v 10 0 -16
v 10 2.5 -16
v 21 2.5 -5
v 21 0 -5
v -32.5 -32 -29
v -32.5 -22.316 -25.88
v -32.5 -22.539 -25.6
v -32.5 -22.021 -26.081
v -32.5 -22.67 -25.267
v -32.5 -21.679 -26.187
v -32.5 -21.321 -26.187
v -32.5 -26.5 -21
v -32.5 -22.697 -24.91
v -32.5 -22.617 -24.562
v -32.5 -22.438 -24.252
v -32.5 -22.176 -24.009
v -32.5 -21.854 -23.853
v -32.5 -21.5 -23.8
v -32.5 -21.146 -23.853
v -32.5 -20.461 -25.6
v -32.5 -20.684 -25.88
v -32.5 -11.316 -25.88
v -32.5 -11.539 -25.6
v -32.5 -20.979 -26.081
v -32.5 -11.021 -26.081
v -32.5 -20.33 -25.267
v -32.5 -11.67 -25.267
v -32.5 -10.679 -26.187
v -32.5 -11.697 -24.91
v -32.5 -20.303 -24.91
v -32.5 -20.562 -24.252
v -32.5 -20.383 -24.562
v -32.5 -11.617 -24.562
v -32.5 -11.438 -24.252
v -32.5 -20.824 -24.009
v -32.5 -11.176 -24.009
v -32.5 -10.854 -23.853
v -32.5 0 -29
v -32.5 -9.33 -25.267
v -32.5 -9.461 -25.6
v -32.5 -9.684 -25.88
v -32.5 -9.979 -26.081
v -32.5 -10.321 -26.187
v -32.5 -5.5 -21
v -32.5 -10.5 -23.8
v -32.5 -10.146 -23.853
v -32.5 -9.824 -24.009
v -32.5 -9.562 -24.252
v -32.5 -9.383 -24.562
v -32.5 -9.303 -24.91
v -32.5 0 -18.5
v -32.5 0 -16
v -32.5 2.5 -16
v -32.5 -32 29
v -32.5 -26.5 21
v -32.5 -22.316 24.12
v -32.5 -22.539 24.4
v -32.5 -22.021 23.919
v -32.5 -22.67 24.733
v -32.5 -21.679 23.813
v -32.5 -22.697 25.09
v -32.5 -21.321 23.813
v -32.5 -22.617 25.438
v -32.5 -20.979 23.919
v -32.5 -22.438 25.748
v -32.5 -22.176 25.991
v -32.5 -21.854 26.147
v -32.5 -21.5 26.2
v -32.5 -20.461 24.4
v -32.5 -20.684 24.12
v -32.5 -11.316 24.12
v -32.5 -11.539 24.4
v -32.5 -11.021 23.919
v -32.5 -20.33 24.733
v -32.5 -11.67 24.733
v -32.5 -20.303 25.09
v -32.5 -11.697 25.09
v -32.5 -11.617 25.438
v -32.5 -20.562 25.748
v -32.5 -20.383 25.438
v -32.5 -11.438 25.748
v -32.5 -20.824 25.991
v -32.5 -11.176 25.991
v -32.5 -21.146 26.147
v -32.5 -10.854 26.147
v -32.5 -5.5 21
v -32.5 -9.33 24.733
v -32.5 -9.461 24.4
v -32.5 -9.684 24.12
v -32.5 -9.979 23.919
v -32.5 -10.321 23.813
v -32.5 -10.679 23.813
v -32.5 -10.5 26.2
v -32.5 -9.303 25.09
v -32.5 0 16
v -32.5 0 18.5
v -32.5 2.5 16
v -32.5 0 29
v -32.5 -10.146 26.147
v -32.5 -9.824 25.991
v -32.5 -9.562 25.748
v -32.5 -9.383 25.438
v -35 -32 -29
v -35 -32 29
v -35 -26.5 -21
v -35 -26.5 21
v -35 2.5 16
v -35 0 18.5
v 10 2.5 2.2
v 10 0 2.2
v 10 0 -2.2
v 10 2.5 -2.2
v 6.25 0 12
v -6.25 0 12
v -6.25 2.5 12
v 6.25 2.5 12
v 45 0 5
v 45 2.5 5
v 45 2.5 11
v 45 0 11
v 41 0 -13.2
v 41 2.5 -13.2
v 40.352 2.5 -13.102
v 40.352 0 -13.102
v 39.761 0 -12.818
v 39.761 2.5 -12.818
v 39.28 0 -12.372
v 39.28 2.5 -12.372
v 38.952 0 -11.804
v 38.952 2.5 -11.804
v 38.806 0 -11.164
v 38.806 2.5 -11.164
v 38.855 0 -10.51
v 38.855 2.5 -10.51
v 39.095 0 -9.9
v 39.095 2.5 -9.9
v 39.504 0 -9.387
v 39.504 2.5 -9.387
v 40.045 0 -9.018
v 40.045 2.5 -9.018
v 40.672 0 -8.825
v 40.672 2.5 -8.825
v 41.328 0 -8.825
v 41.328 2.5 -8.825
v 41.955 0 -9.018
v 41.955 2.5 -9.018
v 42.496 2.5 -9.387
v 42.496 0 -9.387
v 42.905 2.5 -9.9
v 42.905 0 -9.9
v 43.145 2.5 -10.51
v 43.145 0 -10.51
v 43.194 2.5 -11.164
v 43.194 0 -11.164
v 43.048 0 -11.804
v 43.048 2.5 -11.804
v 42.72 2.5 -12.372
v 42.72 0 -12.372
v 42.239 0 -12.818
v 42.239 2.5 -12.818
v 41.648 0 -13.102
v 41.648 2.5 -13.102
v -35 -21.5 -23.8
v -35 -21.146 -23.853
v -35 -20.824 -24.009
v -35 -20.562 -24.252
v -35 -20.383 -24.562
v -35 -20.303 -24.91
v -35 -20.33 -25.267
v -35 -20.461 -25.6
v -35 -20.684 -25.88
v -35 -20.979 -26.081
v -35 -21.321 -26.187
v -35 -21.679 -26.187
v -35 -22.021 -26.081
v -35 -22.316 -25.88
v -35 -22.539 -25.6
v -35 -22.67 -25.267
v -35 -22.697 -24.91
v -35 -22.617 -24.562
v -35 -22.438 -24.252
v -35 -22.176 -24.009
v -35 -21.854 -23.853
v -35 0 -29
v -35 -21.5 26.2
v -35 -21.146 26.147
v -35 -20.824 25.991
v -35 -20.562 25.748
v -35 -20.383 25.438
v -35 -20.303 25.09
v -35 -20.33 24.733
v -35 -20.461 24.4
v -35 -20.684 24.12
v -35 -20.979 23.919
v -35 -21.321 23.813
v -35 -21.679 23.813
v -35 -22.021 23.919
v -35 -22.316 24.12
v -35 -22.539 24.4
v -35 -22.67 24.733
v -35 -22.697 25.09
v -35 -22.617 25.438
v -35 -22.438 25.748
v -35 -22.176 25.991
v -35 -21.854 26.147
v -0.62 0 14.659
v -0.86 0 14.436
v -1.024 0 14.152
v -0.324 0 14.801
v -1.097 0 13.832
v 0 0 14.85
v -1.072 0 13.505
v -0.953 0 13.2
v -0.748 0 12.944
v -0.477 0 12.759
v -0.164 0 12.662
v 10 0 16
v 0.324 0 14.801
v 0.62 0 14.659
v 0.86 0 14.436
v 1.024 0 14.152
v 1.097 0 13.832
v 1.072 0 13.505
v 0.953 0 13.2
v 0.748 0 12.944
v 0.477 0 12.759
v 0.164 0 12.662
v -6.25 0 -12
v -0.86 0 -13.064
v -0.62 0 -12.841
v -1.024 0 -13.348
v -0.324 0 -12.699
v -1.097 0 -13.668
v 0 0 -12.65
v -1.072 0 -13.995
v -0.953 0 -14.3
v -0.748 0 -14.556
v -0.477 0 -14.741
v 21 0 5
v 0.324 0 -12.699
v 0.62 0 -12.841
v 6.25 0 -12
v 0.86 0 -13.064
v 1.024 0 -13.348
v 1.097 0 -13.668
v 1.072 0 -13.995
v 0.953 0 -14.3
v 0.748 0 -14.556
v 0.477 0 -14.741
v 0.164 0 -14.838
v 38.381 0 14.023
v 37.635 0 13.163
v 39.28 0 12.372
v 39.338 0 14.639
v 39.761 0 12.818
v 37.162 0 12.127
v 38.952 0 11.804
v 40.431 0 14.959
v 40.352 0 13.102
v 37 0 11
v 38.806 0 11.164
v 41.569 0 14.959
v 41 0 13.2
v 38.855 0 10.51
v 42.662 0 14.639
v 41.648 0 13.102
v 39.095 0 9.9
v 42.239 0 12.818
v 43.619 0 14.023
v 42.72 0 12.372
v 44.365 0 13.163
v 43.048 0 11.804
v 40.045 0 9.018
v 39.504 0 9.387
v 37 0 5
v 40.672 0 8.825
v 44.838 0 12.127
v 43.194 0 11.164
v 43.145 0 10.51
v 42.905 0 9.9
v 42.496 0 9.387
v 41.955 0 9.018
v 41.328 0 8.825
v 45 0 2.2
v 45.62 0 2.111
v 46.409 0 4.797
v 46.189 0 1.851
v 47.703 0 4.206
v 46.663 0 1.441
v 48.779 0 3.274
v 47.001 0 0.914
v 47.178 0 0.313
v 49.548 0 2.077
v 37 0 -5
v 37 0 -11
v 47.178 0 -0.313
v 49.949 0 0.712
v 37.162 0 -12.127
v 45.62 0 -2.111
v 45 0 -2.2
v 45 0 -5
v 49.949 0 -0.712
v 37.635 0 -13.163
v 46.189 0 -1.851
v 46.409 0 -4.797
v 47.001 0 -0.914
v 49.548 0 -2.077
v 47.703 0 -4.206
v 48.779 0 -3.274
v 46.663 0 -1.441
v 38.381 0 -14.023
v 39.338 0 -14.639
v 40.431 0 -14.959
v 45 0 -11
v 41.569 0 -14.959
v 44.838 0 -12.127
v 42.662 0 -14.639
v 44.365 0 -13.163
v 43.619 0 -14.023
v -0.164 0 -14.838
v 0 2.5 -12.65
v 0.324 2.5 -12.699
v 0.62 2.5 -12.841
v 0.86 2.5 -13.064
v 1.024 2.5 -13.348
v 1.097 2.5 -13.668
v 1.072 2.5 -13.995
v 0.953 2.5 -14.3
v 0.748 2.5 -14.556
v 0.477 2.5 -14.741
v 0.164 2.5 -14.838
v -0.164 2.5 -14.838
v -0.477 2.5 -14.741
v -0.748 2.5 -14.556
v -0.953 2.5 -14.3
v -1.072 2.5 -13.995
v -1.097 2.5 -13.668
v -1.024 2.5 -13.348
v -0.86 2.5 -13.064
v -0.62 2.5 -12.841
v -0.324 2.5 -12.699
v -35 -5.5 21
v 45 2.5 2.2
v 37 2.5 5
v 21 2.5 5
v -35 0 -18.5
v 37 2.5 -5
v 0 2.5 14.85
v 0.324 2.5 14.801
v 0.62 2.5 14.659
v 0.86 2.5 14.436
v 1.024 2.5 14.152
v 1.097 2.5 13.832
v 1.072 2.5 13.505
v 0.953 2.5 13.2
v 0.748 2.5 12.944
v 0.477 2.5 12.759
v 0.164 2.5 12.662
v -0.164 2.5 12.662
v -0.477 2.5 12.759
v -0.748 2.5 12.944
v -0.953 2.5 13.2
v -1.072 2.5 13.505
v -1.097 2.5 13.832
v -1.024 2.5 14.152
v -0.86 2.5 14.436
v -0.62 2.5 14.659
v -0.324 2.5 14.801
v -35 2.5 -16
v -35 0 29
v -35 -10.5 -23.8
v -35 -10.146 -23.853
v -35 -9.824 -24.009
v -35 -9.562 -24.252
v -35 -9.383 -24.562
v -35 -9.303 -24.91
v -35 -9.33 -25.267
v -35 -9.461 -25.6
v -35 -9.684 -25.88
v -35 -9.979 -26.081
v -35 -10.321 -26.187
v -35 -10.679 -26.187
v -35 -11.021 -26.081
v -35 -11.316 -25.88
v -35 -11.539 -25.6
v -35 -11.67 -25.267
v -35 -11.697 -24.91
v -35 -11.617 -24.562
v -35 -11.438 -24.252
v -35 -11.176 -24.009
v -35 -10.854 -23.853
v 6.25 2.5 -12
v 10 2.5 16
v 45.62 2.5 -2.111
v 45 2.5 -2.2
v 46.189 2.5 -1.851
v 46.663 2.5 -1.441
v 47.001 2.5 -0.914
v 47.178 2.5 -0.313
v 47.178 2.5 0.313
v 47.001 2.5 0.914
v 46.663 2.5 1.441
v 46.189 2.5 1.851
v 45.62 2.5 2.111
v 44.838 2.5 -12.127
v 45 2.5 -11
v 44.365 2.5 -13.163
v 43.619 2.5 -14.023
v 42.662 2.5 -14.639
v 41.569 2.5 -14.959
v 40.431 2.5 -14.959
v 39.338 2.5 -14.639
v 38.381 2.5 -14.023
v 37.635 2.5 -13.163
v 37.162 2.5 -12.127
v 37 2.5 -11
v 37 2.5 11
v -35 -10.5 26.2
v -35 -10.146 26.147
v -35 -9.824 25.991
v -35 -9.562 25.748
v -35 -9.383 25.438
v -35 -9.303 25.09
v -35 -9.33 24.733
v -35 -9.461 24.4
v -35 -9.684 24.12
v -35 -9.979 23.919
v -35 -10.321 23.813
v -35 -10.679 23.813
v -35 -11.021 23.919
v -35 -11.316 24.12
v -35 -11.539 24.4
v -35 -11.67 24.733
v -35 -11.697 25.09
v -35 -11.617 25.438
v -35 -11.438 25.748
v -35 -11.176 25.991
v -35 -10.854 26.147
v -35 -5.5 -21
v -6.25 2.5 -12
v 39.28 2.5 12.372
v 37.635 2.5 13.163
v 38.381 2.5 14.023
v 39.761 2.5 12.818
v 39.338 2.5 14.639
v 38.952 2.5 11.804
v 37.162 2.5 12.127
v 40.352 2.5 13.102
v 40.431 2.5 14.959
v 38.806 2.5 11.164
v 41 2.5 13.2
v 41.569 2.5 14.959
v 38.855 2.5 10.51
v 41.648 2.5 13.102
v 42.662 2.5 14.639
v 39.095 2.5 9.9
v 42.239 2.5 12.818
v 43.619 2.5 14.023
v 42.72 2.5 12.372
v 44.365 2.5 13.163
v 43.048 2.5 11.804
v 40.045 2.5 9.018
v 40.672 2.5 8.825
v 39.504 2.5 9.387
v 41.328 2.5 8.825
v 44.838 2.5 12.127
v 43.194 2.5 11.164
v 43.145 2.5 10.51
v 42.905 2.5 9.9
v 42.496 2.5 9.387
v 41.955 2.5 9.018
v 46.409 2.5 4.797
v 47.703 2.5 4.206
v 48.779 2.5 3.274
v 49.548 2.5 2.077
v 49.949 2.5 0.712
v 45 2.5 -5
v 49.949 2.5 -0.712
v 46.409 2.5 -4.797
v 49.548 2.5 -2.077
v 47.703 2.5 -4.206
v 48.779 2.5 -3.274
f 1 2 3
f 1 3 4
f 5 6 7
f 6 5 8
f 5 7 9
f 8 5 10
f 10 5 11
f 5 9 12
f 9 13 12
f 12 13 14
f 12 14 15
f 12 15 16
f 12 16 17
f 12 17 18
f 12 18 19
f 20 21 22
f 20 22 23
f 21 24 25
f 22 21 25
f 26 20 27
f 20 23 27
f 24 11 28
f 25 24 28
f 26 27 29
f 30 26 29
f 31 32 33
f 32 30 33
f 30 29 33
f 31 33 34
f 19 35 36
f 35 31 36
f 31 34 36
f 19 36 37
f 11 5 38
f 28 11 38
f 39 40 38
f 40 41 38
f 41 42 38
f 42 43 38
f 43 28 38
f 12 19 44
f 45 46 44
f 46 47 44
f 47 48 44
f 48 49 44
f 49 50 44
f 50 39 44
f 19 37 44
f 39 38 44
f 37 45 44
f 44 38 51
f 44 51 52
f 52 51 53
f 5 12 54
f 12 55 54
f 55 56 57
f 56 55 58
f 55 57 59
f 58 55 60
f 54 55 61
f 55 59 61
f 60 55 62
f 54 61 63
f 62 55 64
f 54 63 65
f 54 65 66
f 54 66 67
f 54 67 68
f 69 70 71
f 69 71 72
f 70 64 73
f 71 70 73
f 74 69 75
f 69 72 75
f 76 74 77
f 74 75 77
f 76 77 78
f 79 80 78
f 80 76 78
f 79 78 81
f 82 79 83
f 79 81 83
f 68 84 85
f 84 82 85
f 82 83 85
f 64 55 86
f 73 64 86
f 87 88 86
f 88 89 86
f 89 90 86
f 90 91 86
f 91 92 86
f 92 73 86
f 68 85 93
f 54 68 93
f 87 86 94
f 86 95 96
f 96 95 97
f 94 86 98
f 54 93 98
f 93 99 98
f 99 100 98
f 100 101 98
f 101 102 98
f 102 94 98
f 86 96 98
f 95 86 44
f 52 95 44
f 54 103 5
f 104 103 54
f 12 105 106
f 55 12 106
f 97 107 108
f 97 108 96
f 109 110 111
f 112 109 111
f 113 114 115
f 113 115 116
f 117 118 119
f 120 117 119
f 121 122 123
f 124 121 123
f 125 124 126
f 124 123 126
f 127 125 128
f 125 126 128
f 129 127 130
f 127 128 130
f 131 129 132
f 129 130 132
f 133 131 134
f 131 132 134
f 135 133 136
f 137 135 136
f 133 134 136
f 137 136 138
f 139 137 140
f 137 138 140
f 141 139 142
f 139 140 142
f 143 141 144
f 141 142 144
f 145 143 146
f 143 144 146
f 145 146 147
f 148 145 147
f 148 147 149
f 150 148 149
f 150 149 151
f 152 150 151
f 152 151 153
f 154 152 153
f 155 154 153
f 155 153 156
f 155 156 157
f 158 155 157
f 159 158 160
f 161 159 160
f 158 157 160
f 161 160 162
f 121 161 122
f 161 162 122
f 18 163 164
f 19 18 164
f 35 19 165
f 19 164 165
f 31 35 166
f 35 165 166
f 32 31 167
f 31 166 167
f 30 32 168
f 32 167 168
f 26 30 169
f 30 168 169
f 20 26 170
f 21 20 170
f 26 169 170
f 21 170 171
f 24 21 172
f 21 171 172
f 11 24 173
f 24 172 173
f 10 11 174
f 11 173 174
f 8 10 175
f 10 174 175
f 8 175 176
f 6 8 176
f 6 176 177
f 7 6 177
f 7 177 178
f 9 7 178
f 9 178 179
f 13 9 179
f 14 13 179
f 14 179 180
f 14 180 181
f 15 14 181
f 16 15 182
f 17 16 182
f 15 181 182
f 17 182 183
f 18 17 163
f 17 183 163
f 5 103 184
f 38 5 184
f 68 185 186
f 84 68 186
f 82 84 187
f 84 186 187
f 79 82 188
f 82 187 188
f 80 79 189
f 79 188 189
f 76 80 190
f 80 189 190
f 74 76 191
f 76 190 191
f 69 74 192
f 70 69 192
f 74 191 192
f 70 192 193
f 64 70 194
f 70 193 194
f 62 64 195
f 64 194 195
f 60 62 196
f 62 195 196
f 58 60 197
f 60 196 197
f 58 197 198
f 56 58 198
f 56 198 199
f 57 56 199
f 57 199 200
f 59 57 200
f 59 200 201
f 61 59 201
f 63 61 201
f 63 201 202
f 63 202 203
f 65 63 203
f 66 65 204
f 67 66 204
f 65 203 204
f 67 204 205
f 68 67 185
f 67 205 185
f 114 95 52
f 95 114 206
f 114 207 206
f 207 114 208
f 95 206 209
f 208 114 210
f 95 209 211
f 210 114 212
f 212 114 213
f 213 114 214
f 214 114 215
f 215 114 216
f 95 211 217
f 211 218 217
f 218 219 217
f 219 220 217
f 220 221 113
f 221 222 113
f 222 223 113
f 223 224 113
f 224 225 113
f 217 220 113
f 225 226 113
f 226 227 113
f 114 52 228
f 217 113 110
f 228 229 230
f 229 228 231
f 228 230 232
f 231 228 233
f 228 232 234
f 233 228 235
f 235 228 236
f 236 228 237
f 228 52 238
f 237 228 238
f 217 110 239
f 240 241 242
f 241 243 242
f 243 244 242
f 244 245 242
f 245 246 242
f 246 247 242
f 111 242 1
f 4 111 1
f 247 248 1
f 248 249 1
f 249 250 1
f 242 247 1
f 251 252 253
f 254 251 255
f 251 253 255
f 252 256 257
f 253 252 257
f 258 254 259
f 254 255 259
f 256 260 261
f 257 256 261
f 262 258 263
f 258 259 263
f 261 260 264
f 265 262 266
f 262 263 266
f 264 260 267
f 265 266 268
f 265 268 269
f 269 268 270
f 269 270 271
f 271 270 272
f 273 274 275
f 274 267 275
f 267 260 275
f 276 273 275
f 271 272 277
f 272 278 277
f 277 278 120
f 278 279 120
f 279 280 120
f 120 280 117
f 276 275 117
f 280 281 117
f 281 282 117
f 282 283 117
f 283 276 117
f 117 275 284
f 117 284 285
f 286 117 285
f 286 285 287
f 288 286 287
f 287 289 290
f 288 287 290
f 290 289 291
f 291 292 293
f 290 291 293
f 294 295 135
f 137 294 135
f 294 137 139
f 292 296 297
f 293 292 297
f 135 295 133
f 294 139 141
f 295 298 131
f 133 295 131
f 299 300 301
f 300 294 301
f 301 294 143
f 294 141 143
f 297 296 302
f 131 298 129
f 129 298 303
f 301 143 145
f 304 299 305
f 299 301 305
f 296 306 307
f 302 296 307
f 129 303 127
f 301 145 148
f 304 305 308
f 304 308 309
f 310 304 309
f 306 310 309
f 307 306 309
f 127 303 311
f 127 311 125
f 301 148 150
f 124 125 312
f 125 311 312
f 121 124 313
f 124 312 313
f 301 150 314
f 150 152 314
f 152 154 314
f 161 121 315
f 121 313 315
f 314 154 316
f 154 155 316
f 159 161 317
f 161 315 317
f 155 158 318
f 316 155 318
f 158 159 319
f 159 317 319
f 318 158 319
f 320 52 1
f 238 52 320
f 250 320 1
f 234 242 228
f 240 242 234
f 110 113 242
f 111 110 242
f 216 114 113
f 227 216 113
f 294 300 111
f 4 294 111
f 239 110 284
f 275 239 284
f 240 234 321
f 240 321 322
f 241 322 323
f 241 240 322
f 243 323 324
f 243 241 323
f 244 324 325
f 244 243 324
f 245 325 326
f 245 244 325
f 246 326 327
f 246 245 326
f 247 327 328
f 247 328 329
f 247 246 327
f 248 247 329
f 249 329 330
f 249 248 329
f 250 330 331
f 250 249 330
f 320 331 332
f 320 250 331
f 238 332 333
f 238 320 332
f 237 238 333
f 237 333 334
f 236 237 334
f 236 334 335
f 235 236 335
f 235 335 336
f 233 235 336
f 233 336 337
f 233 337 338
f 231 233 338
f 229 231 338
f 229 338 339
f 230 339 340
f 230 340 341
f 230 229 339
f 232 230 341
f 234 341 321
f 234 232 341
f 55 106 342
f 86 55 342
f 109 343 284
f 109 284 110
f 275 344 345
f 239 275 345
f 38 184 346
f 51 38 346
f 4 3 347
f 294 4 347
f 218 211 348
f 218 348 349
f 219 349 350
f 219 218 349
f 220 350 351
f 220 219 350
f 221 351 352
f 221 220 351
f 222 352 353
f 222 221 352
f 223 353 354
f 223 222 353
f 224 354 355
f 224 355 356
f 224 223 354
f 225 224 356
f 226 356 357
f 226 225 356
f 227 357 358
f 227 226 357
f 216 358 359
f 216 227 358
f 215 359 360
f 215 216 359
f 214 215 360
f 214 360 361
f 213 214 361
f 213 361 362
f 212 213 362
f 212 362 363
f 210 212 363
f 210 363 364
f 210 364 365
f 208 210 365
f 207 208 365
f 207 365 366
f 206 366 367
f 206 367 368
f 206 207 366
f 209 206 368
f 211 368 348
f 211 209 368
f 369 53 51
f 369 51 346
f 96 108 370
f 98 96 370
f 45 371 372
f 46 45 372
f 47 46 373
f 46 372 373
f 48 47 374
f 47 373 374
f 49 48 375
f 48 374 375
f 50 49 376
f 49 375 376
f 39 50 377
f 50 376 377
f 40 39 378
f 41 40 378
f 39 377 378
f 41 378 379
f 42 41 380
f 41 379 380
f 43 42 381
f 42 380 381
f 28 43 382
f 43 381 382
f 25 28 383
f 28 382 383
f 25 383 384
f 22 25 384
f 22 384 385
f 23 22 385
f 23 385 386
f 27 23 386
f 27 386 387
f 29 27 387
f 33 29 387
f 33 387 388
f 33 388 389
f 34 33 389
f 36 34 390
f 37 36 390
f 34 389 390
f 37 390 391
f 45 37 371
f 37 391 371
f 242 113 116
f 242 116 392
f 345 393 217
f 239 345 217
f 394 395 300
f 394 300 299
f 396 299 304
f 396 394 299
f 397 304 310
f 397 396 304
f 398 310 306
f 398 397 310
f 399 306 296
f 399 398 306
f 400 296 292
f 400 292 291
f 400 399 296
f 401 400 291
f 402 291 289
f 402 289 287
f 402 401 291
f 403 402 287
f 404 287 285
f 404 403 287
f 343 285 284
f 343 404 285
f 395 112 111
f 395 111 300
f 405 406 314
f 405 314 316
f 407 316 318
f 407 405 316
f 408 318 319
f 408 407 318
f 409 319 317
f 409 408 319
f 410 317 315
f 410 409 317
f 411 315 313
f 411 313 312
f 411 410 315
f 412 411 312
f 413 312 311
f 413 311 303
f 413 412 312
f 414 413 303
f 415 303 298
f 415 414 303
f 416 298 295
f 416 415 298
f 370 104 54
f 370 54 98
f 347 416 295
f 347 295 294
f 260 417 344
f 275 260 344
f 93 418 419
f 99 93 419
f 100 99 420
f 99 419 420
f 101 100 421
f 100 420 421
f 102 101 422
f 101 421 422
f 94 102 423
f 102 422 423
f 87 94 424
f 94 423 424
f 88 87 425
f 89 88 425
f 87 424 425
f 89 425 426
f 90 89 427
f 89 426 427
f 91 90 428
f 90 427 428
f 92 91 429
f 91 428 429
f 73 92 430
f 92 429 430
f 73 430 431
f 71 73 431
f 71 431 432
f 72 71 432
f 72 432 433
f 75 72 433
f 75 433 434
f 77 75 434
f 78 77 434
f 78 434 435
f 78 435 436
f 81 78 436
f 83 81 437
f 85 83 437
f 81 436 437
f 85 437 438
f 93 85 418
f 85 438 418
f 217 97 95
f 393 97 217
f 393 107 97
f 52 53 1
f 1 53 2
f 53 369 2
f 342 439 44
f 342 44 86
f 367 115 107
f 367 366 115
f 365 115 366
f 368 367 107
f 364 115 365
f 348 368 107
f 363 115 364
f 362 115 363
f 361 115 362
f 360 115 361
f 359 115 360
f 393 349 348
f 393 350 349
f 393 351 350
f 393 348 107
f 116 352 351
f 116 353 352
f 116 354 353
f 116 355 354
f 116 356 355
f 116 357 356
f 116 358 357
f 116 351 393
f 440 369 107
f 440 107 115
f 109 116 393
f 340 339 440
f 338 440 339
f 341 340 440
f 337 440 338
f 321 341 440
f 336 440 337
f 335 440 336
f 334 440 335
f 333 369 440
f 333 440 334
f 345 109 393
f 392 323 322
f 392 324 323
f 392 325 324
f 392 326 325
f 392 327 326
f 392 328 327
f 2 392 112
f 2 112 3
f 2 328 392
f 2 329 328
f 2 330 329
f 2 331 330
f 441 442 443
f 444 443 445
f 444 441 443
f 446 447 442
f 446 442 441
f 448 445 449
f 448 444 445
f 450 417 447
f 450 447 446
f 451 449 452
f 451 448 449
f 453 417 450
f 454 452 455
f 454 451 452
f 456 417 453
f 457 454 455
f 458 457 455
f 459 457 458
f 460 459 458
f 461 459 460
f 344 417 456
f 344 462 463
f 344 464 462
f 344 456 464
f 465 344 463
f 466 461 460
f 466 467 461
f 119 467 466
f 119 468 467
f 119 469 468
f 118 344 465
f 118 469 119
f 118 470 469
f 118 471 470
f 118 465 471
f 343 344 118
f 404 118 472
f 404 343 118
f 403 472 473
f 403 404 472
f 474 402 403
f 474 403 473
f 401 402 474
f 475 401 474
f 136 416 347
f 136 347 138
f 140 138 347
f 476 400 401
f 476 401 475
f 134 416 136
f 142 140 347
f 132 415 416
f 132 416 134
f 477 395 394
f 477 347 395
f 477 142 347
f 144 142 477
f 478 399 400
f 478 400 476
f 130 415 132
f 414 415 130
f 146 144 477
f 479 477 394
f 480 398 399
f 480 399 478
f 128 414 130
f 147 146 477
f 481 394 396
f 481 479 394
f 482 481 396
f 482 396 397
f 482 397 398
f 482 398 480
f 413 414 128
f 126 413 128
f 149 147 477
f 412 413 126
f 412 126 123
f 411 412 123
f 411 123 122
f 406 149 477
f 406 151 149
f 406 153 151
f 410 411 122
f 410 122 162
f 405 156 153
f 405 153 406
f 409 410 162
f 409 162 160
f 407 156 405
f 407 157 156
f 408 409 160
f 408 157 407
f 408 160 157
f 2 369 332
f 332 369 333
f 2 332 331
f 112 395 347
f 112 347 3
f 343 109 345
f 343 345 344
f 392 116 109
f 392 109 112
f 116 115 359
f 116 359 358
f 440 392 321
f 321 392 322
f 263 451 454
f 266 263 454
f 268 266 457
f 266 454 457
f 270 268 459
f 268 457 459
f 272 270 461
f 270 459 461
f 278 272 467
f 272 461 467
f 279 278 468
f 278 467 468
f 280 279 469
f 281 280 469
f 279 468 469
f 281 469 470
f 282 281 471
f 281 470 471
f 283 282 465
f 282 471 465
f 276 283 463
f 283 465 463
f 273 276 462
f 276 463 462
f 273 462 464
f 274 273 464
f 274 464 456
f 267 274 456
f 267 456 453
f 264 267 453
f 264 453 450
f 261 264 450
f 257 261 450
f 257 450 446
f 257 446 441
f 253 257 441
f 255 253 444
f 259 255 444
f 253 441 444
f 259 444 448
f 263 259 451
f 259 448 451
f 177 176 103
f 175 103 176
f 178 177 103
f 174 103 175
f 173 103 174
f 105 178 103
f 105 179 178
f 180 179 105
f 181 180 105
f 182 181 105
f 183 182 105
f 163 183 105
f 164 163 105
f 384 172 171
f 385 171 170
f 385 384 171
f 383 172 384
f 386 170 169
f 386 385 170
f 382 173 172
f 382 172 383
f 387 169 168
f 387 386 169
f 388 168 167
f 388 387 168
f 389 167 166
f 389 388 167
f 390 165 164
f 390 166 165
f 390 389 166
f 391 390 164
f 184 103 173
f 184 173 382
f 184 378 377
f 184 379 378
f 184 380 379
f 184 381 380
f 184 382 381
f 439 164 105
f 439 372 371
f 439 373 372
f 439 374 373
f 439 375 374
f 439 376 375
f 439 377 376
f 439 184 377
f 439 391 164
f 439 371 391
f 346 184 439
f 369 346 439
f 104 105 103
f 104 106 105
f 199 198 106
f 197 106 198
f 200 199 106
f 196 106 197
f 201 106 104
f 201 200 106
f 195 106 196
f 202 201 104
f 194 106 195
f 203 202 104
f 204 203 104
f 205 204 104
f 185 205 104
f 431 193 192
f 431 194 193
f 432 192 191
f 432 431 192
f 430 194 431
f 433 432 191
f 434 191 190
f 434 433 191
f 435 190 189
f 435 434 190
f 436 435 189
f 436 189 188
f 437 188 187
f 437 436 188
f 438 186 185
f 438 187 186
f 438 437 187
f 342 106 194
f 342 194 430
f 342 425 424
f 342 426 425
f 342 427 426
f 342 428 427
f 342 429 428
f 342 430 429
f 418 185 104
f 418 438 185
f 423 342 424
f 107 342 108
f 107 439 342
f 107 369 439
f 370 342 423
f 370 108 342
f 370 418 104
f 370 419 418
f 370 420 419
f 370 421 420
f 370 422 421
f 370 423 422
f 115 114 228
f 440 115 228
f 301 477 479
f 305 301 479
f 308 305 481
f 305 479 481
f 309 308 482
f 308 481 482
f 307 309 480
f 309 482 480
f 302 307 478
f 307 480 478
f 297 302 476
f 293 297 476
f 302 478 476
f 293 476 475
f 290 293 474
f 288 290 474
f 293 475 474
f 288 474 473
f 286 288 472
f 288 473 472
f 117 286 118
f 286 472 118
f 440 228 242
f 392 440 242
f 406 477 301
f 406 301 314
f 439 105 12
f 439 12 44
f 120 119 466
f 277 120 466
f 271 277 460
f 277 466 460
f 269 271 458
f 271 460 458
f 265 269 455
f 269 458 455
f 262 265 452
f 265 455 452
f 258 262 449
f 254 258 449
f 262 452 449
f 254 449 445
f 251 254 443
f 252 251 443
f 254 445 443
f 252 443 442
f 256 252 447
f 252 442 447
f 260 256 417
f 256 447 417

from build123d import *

# Parameters (mm, degrees)
SKETCH1_W           = 20
SKETCH1_H           = 32
SKETCH1_R           = 1.1
SKETCH1_W_2         = 12.5
SKETCH1_H_2         = 24
BOSS_EXTRUDE1_DEPTH = 2.5
BOSS_EXTRUDE2_DEPTH = 2.5
CHAMFER1_SIZE       = 11
SKETCH3_R           = 2.2
BOSS_EXTRUDE3_DEPTH = 2.5
SKETCH4_W           = 25
SKETCH4_H           = 32
BOSS_EXTRUDE4_DEPTH = 2.5
SKETCH5_W           = 58
SKETCH5_H           = 32
SKETCH5_R           = 1.2
SKETCH5_W_2         = 42
SKETCH5_H_2         = 21
BOSS_EXTRUDE5_DEPTH = 2.5
CHAMFER2_SIZE       = 2.5


with BuildPart() as part:
    # Sketch1 → Boss-Extrude1 (new body)
    with BuildSketch(Plane(origin=(0, 0, 0), x_dir=(1, 0, 0), z_dir=(0, 1, 0))):
        Rectangle(SKETCH1_W, SKETCH1_H)
        with Locations(Location((0, -13.75, 0), (0, 0, 270))):
            Circle(SKETCH1_R, mode=Mode.SUBTRACT)
        with Locations(Location((0, 13.75, 0), (0, 0, 270))):
            Circle(SKETCH1_R, mode=Mode.SUBTRACT)
        Rectangle(SKETCH1_W_2, SKETCH1_H_2, mode=Mode.SUBTRACT)
    extrude(amount=BOSS_EXTRUDE1_DEPTH)

    # Sketch2 → Boss-Extrude2 (add)
    with BuildSketch(Plane(origin=(0, 2.5, 0), x_dir=(1, 0, 0), z_dir=(0, 1, 0))):
        with BuildLine():
            Line((10, 5), (45, 5))
            ThreePointArc((45, 5), (50, 0), (45, -5))
            Line((45, -5), (10, -5))
            ThreePointArc((10, -5), (7.942810861, -4.557189139), (6.25, -3.307189139))
            Line((6.25, -3.307189139), (6.25, 3.307189139))
            ThreePointArc((6.25, 3.307189139), (7.942810861, 4.557189139), (10, 5))
        make_face()
        with BuildLine():
            Line((10, 2.2), (45, 2.2))
            ThreePointArc((45, 2.2), (47.2, 0), (45, -2.2))
            Line((45, -2.2), (10, -2.2))
            ThreePointArc((10, -2.2), (7.8, 0), (10, 2.2))
        make_face(mode=Mode.SUBTRACT)
    extrude(amount=-BOSS_EXTRUDE2_DEPTH)

    # Chamfer1
    chamfer1_edges = [part.edges().sort_by_distance(p)[0] for p in [
        (10, 1.25, 5),
        (10, 1.25, -5),
    ]]
    chamfer(chamfer1_edges, length=CHAMFER1_SIZE - 0.0001)  # a hair under: the kernel refuses the full size

    # Sketch3 → Boss-Extrude3 (add)
    # profile 1 of 2: a face of its own
    with BuildSketch(Plane(origin=(0, 2.5, 0), x_dir=(1, 0, 0), z_dir=(0, 1, 0))):
        with BuildLine():
            Line((45, -5), (45, -11))
            ThreePointArc((45, -11), (41, -15), (37, -11))
            Line((37, -11), (37, -5))
            Line((37, -5), (45, -5))
        make_face()
        with Locations(Location((41, -11, 0), (0, 0, 270))):
            Circle(SKETCH3_R, mode=Mode.SUBTRACT)
    # profile 2 of 2: a face of its own
    with BuildSketch(Plane(origin=(0, 2.5, 0), x_dir=(1, 0, 0), z_dir=(0, 1, 0))):
        with BuildLine():
            Line((45, 5), (45, 11))
            ThreePointArc((45, 11), (41, 15), (37, 11))
            Line((37, 11), (37, 5))
            Line((37, 5), (45, 5))
        make_face()
        with Locations(Location((41, 11, 0), (0, 0, 90))):
            Circle(SKETCH3_R, mode=Mode.SUBTRACT)
    extrude(amount=-BOSS_EXTRUDE3_DEPTH)

    # Sketch4 → Boss-Extrude4 (add)
    with BuildSketch(Plane(origin=(0, 2.5, 0), x_dir=(1, 0, 0), z_dir=(0, 1, 0))):
        with Locations((-22.5, 0)):
            Rectangle(SKETCH4_W, SKETCH4_H)
    extrude(amount=-BOSS_EXTRUDE4_DEPTH)

    # Sketch5 → Boss-Extrude5 (add)
    with BuildSketch(Plane.ZY.offset(35)):
        with Locations((0, -16)):
            Rectangle(SKETCH5_W, SKETCH5_H)
        with Locations((25, -10.5)):
            Circle(SKETCH5_R, mode=Mode.SUBTRACT)
        with Locations((25, -21.5)):
            Circle(SKETCH5_R, mode=Mode.SUBTRACT)
        with Locations((-25, -10.5)):
            Circle(SKETCH5_R, mode=Mode.SUBTRACT)
        with Locations((-25, -21.5)):
            Circle(SKETCH5_R, mode=Mode.SUBTRACT)
        with Locations((0, -16)):
            Rectangle(SKETCH5_W_2, SKETCH5_H_2, mode=Mode.SUBTRACT)
    extrude(amount=-BOSS_EXTRUDE5_DEPTH)

    # Chamfer2
    chamfer2_edges = [part.edges().sort_by_distance(p)[0] for p in [
        (-33.75, 0, -16),
        (-33.75, 0, 16),
    ]]
    chamfer(chamfer2_edges, length=CHAMFER2_SIZE - 0.0001)  # a hair under: the kernel refuses the full size


solid = part.part
